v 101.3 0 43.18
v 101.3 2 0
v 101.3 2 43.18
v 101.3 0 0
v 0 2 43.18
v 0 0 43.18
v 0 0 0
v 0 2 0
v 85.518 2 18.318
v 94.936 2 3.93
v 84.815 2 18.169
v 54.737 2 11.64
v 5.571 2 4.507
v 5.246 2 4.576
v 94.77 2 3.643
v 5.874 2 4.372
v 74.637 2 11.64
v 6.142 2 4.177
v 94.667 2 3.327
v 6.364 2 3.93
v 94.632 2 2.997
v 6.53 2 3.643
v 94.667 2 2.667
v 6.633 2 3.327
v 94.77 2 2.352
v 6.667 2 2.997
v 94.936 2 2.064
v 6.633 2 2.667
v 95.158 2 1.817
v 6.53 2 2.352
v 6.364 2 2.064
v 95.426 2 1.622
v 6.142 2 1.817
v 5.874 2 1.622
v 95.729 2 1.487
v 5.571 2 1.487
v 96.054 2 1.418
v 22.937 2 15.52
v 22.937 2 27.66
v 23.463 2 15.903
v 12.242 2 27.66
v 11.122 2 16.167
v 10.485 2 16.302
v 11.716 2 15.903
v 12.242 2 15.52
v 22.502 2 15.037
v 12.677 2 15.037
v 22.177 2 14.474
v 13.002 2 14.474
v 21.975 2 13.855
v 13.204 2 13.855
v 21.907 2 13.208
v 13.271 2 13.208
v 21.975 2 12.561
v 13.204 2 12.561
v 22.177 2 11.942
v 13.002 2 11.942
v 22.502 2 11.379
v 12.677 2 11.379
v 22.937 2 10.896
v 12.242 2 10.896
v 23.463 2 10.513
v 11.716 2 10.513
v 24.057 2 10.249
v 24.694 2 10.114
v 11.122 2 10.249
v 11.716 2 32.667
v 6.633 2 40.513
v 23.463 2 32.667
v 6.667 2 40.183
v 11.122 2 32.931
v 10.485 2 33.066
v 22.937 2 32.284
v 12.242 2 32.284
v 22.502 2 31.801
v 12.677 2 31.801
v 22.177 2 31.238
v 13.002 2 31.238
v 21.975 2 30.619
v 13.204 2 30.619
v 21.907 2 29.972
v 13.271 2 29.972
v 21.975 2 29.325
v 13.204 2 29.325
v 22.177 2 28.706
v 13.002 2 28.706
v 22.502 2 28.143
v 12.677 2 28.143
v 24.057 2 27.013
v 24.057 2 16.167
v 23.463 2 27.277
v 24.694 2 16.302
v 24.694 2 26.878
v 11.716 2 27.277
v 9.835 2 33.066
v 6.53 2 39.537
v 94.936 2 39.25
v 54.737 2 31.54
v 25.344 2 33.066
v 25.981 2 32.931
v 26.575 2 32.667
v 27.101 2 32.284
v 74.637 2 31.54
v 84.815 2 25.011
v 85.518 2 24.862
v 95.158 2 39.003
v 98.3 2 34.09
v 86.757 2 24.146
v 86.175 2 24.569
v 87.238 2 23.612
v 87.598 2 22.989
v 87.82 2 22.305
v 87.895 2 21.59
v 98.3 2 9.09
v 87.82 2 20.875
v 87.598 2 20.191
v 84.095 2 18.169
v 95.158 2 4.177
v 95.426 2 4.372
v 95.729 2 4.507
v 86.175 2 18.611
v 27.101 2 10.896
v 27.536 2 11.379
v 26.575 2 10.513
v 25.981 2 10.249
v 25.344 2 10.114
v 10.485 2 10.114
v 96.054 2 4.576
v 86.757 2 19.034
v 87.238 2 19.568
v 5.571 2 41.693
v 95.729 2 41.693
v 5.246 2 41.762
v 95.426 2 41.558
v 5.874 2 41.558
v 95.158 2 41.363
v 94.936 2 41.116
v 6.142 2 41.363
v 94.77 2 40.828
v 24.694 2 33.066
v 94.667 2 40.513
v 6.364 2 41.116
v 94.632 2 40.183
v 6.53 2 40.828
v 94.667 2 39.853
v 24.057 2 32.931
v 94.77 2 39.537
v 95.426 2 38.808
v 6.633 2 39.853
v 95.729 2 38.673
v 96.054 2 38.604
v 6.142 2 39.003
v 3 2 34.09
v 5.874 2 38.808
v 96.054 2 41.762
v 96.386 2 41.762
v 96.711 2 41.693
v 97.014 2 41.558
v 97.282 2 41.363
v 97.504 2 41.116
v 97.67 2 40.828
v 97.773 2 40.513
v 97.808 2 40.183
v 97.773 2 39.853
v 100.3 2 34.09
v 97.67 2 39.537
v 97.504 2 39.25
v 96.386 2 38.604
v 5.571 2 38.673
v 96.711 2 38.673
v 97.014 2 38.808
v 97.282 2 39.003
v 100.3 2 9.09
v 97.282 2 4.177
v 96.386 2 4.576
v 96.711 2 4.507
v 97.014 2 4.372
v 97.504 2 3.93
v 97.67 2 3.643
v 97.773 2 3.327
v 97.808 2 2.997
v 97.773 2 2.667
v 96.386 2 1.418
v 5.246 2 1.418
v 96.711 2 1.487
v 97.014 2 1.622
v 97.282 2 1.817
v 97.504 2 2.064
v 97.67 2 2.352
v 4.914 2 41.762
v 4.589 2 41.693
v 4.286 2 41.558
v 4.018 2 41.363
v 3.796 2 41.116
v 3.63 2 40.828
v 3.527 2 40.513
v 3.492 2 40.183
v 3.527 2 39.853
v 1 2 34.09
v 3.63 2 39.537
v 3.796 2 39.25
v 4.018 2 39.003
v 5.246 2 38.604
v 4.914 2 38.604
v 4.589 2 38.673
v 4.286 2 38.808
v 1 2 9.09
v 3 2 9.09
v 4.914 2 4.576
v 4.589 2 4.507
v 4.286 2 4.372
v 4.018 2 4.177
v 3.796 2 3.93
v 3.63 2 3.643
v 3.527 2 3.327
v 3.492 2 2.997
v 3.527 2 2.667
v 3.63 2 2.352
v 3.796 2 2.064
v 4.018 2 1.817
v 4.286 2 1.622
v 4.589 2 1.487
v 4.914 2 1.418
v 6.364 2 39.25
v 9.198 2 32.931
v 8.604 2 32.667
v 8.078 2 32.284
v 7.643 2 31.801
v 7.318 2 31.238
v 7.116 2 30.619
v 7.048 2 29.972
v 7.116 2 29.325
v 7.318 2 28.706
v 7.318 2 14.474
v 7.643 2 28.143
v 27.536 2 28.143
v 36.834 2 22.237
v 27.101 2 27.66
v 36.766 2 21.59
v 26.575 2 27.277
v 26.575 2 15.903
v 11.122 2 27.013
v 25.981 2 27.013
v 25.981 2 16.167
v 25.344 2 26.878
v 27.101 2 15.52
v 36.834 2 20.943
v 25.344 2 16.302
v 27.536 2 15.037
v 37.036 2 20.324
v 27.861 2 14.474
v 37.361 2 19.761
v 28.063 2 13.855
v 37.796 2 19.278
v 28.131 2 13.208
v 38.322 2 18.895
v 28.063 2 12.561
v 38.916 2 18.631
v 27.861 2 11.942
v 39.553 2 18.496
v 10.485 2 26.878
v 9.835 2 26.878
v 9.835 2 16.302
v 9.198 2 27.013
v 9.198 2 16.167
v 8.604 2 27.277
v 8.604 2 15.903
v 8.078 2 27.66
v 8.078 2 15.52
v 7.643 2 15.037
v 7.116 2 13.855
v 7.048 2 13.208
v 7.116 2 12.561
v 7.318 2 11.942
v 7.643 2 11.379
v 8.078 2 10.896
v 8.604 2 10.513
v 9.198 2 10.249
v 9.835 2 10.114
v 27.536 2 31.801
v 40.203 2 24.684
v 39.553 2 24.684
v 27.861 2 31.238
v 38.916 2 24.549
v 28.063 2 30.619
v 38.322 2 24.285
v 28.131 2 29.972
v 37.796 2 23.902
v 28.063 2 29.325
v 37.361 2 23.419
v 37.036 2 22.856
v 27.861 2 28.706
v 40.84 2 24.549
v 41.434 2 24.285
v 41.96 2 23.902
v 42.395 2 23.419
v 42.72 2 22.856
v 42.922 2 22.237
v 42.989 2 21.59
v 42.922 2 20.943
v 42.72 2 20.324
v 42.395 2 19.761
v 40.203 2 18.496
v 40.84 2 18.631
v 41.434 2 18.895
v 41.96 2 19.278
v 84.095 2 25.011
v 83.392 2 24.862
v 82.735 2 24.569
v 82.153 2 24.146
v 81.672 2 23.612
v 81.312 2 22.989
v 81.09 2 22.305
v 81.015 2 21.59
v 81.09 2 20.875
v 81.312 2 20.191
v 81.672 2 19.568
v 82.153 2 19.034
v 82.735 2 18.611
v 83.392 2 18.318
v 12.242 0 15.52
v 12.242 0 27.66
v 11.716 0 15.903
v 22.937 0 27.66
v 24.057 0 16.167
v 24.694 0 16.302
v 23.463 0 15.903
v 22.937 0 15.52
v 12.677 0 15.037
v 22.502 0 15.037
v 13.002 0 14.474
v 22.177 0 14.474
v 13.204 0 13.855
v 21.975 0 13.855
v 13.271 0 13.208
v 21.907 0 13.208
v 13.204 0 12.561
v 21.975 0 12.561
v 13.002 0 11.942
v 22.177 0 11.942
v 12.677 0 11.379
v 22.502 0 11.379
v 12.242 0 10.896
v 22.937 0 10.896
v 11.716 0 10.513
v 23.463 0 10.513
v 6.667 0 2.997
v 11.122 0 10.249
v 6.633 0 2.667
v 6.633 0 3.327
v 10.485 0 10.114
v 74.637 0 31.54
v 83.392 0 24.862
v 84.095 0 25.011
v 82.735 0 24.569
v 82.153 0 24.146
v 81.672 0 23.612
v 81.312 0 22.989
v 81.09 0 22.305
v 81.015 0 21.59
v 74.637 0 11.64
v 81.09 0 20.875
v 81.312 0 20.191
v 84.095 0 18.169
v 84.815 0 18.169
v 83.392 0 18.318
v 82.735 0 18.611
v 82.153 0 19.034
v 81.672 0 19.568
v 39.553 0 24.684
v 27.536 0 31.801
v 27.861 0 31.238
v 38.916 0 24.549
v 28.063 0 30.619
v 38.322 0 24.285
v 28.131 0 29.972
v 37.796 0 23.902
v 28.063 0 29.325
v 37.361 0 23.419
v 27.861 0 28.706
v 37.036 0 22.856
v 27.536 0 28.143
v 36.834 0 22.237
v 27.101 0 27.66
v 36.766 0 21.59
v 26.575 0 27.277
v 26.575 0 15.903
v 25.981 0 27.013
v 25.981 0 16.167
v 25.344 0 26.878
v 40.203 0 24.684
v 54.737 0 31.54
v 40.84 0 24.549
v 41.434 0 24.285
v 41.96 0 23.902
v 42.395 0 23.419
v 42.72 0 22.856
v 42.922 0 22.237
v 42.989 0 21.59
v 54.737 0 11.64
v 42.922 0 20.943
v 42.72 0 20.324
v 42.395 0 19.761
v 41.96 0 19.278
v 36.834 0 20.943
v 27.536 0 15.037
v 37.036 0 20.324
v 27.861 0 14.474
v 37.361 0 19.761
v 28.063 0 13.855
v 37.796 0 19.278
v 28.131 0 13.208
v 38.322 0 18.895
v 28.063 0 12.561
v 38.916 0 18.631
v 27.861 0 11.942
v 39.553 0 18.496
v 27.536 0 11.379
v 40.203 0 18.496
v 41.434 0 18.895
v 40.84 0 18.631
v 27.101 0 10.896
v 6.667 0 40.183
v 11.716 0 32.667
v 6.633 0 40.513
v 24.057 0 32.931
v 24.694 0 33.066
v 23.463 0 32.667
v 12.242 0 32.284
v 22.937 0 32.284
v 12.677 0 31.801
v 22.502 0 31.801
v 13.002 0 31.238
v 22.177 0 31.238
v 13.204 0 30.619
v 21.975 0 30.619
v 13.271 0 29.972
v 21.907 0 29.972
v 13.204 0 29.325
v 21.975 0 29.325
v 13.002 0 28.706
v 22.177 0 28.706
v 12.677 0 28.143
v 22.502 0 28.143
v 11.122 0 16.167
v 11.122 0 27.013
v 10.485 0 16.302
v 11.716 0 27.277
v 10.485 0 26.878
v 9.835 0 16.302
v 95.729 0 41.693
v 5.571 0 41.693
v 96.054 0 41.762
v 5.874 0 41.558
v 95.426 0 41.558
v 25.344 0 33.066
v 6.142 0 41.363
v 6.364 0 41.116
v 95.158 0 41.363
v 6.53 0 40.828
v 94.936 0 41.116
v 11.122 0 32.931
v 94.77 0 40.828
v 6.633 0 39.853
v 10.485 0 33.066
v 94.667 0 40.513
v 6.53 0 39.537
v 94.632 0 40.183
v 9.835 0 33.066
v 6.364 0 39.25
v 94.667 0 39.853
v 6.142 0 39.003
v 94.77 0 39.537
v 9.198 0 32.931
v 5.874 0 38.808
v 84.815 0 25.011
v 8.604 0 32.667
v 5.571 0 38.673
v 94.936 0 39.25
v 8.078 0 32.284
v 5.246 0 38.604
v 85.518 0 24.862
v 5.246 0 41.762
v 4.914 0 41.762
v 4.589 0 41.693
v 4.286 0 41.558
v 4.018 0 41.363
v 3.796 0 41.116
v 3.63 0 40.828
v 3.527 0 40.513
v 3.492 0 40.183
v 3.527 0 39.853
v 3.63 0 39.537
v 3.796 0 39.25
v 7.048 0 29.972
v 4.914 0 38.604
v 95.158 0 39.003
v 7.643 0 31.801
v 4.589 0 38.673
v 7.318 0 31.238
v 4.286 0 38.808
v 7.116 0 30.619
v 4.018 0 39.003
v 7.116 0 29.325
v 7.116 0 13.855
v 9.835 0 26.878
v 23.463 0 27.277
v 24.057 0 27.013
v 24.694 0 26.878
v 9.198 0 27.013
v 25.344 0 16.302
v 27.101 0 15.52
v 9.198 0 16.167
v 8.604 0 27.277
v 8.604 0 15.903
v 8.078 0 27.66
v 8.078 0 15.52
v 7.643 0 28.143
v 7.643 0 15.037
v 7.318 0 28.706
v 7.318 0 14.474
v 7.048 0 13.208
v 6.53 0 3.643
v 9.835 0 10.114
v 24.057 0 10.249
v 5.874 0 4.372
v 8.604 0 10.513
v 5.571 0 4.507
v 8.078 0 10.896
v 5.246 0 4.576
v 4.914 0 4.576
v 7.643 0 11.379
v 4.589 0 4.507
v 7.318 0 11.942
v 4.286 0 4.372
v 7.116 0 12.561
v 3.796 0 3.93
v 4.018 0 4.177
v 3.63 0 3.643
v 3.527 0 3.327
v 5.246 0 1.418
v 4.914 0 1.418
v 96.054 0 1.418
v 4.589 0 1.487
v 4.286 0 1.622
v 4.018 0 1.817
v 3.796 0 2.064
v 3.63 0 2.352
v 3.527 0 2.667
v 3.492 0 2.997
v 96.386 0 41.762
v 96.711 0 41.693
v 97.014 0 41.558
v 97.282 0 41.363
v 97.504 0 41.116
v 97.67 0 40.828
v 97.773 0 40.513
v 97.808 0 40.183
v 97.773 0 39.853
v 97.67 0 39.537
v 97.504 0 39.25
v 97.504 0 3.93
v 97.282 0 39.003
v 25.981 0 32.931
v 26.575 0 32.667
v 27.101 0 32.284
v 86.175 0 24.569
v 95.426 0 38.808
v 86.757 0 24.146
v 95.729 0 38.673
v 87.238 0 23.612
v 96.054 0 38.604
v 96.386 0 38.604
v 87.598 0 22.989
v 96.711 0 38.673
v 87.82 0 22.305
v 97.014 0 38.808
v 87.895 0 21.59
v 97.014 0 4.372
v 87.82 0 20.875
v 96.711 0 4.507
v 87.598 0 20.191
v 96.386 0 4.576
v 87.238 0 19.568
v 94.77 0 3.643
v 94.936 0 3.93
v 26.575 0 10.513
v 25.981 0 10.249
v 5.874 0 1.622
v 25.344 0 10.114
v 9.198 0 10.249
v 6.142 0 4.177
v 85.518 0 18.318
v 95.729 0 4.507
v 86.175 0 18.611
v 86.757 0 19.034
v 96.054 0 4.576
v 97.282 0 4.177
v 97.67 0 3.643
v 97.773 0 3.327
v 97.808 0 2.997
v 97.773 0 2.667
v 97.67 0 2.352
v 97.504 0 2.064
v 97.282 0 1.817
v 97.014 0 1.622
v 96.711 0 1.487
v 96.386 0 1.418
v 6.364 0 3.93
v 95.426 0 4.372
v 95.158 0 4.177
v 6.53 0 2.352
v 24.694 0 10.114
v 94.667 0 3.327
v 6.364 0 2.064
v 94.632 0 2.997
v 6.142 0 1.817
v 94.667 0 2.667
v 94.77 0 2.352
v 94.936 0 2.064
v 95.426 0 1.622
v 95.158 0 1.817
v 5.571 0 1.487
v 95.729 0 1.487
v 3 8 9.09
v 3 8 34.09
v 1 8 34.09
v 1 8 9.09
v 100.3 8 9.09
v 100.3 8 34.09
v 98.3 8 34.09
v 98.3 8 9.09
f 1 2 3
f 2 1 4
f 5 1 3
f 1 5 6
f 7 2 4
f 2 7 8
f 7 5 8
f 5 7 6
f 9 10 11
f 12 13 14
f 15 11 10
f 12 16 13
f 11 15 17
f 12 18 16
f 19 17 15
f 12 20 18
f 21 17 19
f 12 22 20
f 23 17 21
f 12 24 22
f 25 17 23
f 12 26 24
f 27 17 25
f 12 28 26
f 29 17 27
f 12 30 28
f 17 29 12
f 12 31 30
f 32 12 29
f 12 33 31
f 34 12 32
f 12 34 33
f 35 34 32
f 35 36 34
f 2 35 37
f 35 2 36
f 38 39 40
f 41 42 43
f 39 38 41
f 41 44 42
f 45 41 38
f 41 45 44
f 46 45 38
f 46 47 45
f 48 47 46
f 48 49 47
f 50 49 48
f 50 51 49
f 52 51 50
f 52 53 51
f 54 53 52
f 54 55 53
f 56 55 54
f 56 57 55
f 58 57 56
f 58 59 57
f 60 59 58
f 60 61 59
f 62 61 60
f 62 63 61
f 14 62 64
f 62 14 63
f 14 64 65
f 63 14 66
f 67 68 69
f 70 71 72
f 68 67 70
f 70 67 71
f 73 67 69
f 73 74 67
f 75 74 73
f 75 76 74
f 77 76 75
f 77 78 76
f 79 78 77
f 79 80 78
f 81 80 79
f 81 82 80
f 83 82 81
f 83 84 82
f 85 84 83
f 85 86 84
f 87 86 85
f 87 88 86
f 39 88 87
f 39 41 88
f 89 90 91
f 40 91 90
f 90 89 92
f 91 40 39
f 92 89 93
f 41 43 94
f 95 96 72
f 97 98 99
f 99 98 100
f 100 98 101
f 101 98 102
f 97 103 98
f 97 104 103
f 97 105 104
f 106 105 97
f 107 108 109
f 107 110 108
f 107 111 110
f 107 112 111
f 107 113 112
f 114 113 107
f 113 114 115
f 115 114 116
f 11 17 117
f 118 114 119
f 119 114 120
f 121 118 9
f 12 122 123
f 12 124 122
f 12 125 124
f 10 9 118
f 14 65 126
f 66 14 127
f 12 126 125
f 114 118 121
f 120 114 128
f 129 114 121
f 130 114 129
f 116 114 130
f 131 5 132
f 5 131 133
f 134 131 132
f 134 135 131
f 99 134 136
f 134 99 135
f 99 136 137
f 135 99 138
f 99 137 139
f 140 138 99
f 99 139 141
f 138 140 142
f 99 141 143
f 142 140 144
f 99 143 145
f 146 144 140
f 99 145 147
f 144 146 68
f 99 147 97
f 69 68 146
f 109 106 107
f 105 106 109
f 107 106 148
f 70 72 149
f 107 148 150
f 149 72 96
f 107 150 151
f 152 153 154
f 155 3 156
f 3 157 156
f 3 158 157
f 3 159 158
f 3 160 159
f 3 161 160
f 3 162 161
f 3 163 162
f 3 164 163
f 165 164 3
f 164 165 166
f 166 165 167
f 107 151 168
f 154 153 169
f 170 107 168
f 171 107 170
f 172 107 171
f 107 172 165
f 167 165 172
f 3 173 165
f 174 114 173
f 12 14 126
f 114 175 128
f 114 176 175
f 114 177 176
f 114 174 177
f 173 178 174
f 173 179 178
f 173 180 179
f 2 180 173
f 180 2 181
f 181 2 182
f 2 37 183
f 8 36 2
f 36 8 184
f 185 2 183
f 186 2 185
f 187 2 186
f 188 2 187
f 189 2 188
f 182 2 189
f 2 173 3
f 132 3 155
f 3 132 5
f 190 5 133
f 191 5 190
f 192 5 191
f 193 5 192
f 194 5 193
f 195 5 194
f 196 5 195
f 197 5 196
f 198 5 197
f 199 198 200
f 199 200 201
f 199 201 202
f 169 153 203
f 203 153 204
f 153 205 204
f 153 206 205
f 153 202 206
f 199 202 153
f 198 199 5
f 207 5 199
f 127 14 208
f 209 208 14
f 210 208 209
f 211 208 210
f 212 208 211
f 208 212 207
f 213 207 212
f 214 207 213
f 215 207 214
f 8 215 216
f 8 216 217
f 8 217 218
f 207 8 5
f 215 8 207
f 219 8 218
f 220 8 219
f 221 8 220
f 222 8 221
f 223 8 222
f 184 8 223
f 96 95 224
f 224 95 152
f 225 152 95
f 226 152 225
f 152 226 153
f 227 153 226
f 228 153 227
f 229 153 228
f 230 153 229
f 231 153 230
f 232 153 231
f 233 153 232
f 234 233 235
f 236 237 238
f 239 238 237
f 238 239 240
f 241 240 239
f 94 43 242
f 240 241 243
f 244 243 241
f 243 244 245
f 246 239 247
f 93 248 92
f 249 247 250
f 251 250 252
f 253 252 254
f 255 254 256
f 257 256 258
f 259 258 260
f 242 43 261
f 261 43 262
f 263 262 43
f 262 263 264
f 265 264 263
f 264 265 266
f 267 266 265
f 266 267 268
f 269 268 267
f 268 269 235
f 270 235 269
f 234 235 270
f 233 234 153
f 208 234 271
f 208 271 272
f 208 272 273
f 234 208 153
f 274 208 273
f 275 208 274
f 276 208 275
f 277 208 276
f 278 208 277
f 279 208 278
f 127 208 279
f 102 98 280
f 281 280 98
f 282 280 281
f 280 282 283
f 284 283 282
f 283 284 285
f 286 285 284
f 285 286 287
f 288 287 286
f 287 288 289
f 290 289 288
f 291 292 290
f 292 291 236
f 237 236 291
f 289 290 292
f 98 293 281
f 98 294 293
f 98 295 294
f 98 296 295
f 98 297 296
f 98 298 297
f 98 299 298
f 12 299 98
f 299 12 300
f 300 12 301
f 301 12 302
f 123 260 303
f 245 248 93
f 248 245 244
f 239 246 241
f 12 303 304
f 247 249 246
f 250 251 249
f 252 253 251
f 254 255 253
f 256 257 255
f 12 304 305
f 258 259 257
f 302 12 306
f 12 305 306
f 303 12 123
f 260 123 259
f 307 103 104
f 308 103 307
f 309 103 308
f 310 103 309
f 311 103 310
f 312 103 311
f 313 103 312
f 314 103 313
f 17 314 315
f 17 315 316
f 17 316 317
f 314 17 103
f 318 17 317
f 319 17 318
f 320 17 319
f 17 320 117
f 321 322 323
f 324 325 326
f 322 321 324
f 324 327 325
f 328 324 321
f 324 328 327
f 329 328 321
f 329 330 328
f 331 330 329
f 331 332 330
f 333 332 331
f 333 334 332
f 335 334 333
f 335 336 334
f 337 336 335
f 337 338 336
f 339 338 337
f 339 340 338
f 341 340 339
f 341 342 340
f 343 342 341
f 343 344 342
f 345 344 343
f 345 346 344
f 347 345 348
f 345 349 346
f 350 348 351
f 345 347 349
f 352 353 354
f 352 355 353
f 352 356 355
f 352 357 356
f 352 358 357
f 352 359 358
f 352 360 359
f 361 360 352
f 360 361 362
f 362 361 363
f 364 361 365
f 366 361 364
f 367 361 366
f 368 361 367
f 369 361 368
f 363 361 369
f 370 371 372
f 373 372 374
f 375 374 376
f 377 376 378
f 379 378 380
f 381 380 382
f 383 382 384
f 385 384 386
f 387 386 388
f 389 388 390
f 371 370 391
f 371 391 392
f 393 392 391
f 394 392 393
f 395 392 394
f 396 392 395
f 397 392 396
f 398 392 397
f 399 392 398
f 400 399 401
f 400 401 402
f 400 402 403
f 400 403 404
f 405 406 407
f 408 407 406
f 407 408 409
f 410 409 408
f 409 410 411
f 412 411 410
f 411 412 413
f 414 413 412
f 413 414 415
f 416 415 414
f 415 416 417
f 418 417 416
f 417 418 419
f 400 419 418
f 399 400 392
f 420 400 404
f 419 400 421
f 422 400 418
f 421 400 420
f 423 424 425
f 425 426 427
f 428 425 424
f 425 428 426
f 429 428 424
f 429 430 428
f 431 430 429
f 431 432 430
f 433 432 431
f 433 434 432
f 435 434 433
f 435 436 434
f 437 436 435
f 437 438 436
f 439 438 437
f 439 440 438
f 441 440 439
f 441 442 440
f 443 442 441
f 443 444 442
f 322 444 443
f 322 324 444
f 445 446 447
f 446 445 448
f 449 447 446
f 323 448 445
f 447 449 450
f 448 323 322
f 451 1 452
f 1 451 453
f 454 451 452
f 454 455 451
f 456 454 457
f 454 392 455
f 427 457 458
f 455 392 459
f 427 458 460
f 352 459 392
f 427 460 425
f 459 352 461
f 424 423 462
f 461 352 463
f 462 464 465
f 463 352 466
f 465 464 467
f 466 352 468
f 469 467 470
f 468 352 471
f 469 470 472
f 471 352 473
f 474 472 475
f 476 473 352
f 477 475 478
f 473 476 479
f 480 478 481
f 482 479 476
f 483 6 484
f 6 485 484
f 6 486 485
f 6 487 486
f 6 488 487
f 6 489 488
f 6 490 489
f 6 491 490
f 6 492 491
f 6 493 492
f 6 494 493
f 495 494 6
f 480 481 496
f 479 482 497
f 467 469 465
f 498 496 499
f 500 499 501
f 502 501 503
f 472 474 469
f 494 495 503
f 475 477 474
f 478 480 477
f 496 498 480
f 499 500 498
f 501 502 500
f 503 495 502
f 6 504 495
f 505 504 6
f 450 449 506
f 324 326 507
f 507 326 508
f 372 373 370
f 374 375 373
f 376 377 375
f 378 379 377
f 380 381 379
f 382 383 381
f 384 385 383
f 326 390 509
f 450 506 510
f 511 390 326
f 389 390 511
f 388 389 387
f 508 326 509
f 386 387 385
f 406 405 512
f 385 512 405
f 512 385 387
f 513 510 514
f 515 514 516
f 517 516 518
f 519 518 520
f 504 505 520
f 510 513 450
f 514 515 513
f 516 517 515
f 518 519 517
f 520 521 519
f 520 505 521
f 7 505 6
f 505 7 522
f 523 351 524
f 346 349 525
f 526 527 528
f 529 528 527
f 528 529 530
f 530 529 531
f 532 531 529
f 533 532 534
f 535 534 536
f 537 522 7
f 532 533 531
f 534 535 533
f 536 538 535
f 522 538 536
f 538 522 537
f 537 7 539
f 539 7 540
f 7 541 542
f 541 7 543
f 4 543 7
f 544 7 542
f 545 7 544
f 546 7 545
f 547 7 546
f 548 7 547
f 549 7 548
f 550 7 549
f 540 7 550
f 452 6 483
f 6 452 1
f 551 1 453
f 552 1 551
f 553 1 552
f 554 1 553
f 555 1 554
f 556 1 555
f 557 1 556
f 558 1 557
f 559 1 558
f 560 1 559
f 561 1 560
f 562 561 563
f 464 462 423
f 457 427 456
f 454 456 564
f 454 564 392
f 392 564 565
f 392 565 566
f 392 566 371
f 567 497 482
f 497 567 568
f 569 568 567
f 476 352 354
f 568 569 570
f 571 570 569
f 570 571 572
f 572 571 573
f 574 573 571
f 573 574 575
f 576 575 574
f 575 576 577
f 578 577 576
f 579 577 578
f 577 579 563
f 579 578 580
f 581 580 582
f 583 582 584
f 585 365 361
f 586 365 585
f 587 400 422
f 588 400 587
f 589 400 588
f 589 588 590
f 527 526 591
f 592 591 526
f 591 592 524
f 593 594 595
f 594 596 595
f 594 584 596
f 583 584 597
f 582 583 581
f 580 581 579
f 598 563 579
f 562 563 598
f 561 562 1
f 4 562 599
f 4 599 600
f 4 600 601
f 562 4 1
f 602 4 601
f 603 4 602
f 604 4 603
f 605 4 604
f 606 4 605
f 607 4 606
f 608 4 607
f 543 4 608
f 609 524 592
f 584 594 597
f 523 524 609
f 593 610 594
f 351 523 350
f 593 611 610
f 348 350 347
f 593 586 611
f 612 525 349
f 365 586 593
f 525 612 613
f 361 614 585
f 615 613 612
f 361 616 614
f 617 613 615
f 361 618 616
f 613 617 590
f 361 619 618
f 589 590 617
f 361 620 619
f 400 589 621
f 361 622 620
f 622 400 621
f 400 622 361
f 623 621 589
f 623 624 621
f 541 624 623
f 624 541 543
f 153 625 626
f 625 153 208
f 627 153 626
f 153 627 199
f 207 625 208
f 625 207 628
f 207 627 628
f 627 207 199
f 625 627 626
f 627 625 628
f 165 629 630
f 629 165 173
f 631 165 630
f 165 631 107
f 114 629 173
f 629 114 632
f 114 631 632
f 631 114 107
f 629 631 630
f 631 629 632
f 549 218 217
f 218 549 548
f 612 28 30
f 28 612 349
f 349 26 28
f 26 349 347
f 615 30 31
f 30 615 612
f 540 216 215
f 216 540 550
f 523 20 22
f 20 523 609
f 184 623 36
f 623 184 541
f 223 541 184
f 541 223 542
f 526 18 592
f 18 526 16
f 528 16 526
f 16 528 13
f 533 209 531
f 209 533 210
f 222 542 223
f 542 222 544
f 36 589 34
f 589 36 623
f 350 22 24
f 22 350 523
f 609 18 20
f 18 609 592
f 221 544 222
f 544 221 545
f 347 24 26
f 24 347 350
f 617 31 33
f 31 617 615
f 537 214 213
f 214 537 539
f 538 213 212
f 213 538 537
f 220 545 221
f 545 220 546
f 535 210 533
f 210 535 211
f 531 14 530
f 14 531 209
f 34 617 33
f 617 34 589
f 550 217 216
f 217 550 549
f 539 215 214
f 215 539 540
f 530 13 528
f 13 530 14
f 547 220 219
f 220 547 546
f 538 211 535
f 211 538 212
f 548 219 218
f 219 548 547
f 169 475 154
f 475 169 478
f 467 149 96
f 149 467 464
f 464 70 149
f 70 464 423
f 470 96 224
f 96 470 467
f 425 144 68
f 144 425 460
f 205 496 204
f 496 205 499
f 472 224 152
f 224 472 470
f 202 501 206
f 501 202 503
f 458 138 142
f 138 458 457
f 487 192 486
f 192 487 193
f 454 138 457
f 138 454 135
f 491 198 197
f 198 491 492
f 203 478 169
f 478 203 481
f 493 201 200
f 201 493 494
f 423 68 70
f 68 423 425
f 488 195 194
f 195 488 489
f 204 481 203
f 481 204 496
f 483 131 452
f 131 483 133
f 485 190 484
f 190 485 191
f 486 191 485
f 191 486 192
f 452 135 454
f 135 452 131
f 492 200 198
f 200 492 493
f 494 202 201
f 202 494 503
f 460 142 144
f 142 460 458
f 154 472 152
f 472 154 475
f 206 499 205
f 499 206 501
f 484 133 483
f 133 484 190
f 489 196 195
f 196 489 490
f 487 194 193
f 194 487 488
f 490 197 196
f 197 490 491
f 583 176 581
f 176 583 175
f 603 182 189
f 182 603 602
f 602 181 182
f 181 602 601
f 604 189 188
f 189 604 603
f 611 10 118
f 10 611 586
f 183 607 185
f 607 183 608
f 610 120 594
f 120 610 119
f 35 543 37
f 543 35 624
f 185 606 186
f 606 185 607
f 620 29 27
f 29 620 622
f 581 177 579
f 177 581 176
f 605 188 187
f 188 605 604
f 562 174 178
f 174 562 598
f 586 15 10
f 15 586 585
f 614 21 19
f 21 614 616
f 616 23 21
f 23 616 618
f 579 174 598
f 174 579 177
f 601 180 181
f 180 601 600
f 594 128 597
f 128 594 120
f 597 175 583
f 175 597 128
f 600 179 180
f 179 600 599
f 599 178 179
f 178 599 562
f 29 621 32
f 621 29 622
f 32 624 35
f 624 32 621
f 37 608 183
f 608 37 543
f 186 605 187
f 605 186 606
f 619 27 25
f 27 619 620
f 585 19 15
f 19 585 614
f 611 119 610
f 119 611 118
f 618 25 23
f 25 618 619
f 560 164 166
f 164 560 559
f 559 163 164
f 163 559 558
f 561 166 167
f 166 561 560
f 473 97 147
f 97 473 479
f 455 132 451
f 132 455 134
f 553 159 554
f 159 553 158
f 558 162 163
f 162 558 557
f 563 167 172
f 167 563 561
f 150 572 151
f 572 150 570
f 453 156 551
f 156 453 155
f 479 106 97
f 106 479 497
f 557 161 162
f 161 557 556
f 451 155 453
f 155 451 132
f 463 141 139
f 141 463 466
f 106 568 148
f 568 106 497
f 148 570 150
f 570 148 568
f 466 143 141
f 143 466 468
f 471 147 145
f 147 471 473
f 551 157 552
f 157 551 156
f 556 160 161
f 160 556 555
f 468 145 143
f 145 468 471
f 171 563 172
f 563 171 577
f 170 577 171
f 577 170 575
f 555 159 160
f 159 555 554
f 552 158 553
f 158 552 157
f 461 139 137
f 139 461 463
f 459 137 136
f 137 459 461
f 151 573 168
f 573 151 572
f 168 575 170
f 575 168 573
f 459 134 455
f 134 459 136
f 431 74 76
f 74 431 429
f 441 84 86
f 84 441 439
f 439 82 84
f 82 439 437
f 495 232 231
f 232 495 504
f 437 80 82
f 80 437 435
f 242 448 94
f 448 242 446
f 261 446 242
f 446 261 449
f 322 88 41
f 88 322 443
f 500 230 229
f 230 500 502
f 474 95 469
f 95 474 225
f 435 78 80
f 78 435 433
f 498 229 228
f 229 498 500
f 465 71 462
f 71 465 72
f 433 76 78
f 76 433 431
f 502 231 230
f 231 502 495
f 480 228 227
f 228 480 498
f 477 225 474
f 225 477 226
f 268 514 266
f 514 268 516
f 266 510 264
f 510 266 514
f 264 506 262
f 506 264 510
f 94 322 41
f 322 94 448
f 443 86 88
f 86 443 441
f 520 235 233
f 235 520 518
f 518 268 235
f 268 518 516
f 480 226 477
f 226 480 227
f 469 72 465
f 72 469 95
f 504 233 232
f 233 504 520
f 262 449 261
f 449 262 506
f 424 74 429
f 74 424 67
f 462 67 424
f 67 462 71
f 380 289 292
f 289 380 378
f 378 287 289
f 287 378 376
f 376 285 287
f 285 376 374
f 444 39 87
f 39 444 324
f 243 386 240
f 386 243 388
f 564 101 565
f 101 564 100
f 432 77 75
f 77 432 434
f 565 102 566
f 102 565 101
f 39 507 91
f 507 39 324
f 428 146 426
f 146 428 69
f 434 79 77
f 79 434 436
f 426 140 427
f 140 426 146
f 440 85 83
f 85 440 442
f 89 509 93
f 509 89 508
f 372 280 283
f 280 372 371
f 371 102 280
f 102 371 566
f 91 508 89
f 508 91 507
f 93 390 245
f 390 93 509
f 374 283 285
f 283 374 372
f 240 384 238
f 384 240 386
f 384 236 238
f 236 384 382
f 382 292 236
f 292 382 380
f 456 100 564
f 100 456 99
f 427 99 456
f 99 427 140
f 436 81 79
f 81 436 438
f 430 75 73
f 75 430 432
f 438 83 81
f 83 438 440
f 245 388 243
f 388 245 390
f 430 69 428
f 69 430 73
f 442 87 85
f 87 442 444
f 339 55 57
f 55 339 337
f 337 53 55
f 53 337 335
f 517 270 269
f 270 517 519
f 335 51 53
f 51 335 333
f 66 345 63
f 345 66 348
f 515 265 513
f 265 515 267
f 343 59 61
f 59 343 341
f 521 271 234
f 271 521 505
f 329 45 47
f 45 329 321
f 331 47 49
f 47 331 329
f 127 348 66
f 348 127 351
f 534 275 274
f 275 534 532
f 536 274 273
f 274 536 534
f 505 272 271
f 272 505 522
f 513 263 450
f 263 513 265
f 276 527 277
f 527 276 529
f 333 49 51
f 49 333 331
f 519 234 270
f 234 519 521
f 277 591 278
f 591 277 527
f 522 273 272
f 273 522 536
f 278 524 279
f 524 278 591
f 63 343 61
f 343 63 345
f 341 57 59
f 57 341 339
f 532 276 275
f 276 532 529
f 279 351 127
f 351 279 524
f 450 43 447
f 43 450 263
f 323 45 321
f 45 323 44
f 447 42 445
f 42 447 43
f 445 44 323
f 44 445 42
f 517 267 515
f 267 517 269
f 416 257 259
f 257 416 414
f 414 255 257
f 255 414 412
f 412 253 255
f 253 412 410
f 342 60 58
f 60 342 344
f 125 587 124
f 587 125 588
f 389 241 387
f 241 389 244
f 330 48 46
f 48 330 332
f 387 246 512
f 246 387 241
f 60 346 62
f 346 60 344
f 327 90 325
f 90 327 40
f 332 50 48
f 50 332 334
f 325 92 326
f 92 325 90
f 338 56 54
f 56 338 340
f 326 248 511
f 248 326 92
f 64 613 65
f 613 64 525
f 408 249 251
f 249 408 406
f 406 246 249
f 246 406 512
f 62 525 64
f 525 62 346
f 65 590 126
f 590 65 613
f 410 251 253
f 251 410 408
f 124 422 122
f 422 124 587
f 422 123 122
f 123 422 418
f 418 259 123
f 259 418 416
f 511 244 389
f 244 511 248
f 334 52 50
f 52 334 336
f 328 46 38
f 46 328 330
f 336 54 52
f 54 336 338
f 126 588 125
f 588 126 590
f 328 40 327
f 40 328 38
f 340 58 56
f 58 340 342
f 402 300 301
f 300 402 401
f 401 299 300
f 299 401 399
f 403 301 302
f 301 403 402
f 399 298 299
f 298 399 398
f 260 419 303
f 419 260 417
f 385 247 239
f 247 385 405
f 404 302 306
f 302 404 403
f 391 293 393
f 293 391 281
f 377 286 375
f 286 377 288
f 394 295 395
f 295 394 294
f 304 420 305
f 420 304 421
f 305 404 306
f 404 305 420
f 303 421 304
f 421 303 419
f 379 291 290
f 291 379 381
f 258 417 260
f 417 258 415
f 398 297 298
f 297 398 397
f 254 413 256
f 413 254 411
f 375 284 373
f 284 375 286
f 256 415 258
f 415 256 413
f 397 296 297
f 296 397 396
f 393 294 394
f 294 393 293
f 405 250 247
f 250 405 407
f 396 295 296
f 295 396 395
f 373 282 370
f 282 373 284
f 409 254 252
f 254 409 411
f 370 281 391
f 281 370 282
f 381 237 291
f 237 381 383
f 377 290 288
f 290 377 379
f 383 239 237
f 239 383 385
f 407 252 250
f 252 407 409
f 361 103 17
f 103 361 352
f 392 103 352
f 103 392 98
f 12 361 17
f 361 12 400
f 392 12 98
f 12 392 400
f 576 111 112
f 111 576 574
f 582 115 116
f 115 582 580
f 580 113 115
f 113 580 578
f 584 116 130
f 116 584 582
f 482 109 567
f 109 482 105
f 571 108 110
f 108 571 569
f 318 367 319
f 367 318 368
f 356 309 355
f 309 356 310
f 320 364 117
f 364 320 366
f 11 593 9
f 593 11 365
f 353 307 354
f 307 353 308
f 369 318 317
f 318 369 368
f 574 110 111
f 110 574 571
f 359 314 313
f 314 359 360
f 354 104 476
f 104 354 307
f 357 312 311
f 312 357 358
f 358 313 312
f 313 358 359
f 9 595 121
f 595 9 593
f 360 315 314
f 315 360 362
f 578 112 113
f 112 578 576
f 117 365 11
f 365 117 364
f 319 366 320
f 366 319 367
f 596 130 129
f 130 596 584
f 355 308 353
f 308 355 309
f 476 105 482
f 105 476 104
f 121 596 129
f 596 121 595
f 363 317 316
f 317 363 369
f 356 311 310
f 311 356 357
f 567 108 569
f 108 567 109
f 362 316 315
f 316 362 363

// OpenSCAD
// file: tile_common.scad
/*
Common modules and functions for 1U Tiles
*/

function inches( x) = x * 25.4; // convert inches to mm

// put a hole in the tile of diameter 'd' at position 'x','z'
module hole( x, z, d) {
    translate([x, 0, z])
        rotate([270,0,0])
            cylinder(r=(d / 2), h=10, center=true);
}
// file: blank_tile.scad
/*
A Pulp Logic compatible 1U blank tile.

based on the dimensions given here:
http://pulplogic.com/1u_tiles/

units: millimeters
*/

use <tile_common.scad>;

plate_height = inches(1.7); // spec is 1.7"

module front_face(plate_width) {
    thickness = 2; // thickness of PCB front panels
    cube([plate_width, thickness, plate_height], center=false);
}

rib_width = 2;
rib_inset = 1;
rib_height = 25; // max physically measured at 29.06
rib_depth = 8;
module left_stiffening_rib() {
    translate([rib_inset, 0, ((plate_height - rib_height) / 2)]){
        cube([rib_width, rib_depth, rib_height], center=false);
    }
}

module right_stiffening_rib(plate_width) {
    translate([((plate_width - rib_width) - rib_inset), 0, ((plate_height - rib_height) / 2)]){
        cube([rib_width, rib_depth, rib_height], center=false);
    }
}

module material(plate_width) {
    union() {
        front_face(plate_width);
        left_stiffening_rib();
        right_stiffening_rib(plate_width);
    }
}

module mounting_holes(plate_width) {
    // make round shapes more fine
    $fs = 0.1;

    mounting_hole_dia = inches(0.125); // spec 0.125"
    hole_horiz_offset = inches(0.200); // spec 0.200"
    hole_vert_offset = inches(0.118); // spec 0.118"

    module hole_pair(h_offset) {
        hole(x=h_offset, z=hole_vert_offset, d=mounting_hole_dia);
        
        hole(x=h_offset, z=(plate_height - hole_vert_offset), d=mounting_hole_dia);
    }
    hole_pair(hole_horiz_offset);
    hole_pair(plate_width - hole_horiz_offset);
}

module cutouts(plate_width) {
    mounting_holes(plate_width);
}

// hp is the width in eurorack 'hole positions'
module blank_tile(hp = 6) {
    plate_width = hp * 5.08 - 0.3; // general conversion factor with fudge for tolerance
    difference() {
        material(plate_width);
        cutouts(plate_width);
    }
}

blank_tile();
// main file
/*
A Pulp Logic compatible 1U with cutouts .

modified version of 'six_jacks.scad'

units: millimeters
*/

use <blank_tile.scad>
use <tile_common.scad>

module cutouts() {
    $fs=0.01; // make cylinder curves more fine
    // Rows
    top = inches(1.180);
    bottom = inches(0.520);
    // Columns
    col_spacing = 0.585;
    left = inches(0.4);
    center = left + inches(col_spacing);
    right = left + 2 * inches(col_spacing);

    // top-left jack
    hole(x=left, z=top, d=inches(0.245));

    // top-center jack
    hole(x=center, z=top, d=inches(0.245));

    // bottom-left jack
    hole(x=left, z=bottom, d=inches(0.245));

    // bottom-center jack
    hole(x=center, z=bottom, d=inches(0.245));

    // right-most jack
    hole(x=right, z=(top+bottom)/2, d=inches(0.245));

    // screen: http://adafru.it/454
    translate([left + 3 * inches(col_spacing), -1, (top+bottom)/2 - 19.9/2 ] ){
        cube([19.9, 4, 19.9]);
    }

    // encoder for menus
    hole(x=left + 5 * inches(col_spacing), z=(top+bottom)/2, d=6.88);
}

module six_jacks() {
    difference() {
        blank_tile(20);
        cutouts();
    }
}

six_jacks();
